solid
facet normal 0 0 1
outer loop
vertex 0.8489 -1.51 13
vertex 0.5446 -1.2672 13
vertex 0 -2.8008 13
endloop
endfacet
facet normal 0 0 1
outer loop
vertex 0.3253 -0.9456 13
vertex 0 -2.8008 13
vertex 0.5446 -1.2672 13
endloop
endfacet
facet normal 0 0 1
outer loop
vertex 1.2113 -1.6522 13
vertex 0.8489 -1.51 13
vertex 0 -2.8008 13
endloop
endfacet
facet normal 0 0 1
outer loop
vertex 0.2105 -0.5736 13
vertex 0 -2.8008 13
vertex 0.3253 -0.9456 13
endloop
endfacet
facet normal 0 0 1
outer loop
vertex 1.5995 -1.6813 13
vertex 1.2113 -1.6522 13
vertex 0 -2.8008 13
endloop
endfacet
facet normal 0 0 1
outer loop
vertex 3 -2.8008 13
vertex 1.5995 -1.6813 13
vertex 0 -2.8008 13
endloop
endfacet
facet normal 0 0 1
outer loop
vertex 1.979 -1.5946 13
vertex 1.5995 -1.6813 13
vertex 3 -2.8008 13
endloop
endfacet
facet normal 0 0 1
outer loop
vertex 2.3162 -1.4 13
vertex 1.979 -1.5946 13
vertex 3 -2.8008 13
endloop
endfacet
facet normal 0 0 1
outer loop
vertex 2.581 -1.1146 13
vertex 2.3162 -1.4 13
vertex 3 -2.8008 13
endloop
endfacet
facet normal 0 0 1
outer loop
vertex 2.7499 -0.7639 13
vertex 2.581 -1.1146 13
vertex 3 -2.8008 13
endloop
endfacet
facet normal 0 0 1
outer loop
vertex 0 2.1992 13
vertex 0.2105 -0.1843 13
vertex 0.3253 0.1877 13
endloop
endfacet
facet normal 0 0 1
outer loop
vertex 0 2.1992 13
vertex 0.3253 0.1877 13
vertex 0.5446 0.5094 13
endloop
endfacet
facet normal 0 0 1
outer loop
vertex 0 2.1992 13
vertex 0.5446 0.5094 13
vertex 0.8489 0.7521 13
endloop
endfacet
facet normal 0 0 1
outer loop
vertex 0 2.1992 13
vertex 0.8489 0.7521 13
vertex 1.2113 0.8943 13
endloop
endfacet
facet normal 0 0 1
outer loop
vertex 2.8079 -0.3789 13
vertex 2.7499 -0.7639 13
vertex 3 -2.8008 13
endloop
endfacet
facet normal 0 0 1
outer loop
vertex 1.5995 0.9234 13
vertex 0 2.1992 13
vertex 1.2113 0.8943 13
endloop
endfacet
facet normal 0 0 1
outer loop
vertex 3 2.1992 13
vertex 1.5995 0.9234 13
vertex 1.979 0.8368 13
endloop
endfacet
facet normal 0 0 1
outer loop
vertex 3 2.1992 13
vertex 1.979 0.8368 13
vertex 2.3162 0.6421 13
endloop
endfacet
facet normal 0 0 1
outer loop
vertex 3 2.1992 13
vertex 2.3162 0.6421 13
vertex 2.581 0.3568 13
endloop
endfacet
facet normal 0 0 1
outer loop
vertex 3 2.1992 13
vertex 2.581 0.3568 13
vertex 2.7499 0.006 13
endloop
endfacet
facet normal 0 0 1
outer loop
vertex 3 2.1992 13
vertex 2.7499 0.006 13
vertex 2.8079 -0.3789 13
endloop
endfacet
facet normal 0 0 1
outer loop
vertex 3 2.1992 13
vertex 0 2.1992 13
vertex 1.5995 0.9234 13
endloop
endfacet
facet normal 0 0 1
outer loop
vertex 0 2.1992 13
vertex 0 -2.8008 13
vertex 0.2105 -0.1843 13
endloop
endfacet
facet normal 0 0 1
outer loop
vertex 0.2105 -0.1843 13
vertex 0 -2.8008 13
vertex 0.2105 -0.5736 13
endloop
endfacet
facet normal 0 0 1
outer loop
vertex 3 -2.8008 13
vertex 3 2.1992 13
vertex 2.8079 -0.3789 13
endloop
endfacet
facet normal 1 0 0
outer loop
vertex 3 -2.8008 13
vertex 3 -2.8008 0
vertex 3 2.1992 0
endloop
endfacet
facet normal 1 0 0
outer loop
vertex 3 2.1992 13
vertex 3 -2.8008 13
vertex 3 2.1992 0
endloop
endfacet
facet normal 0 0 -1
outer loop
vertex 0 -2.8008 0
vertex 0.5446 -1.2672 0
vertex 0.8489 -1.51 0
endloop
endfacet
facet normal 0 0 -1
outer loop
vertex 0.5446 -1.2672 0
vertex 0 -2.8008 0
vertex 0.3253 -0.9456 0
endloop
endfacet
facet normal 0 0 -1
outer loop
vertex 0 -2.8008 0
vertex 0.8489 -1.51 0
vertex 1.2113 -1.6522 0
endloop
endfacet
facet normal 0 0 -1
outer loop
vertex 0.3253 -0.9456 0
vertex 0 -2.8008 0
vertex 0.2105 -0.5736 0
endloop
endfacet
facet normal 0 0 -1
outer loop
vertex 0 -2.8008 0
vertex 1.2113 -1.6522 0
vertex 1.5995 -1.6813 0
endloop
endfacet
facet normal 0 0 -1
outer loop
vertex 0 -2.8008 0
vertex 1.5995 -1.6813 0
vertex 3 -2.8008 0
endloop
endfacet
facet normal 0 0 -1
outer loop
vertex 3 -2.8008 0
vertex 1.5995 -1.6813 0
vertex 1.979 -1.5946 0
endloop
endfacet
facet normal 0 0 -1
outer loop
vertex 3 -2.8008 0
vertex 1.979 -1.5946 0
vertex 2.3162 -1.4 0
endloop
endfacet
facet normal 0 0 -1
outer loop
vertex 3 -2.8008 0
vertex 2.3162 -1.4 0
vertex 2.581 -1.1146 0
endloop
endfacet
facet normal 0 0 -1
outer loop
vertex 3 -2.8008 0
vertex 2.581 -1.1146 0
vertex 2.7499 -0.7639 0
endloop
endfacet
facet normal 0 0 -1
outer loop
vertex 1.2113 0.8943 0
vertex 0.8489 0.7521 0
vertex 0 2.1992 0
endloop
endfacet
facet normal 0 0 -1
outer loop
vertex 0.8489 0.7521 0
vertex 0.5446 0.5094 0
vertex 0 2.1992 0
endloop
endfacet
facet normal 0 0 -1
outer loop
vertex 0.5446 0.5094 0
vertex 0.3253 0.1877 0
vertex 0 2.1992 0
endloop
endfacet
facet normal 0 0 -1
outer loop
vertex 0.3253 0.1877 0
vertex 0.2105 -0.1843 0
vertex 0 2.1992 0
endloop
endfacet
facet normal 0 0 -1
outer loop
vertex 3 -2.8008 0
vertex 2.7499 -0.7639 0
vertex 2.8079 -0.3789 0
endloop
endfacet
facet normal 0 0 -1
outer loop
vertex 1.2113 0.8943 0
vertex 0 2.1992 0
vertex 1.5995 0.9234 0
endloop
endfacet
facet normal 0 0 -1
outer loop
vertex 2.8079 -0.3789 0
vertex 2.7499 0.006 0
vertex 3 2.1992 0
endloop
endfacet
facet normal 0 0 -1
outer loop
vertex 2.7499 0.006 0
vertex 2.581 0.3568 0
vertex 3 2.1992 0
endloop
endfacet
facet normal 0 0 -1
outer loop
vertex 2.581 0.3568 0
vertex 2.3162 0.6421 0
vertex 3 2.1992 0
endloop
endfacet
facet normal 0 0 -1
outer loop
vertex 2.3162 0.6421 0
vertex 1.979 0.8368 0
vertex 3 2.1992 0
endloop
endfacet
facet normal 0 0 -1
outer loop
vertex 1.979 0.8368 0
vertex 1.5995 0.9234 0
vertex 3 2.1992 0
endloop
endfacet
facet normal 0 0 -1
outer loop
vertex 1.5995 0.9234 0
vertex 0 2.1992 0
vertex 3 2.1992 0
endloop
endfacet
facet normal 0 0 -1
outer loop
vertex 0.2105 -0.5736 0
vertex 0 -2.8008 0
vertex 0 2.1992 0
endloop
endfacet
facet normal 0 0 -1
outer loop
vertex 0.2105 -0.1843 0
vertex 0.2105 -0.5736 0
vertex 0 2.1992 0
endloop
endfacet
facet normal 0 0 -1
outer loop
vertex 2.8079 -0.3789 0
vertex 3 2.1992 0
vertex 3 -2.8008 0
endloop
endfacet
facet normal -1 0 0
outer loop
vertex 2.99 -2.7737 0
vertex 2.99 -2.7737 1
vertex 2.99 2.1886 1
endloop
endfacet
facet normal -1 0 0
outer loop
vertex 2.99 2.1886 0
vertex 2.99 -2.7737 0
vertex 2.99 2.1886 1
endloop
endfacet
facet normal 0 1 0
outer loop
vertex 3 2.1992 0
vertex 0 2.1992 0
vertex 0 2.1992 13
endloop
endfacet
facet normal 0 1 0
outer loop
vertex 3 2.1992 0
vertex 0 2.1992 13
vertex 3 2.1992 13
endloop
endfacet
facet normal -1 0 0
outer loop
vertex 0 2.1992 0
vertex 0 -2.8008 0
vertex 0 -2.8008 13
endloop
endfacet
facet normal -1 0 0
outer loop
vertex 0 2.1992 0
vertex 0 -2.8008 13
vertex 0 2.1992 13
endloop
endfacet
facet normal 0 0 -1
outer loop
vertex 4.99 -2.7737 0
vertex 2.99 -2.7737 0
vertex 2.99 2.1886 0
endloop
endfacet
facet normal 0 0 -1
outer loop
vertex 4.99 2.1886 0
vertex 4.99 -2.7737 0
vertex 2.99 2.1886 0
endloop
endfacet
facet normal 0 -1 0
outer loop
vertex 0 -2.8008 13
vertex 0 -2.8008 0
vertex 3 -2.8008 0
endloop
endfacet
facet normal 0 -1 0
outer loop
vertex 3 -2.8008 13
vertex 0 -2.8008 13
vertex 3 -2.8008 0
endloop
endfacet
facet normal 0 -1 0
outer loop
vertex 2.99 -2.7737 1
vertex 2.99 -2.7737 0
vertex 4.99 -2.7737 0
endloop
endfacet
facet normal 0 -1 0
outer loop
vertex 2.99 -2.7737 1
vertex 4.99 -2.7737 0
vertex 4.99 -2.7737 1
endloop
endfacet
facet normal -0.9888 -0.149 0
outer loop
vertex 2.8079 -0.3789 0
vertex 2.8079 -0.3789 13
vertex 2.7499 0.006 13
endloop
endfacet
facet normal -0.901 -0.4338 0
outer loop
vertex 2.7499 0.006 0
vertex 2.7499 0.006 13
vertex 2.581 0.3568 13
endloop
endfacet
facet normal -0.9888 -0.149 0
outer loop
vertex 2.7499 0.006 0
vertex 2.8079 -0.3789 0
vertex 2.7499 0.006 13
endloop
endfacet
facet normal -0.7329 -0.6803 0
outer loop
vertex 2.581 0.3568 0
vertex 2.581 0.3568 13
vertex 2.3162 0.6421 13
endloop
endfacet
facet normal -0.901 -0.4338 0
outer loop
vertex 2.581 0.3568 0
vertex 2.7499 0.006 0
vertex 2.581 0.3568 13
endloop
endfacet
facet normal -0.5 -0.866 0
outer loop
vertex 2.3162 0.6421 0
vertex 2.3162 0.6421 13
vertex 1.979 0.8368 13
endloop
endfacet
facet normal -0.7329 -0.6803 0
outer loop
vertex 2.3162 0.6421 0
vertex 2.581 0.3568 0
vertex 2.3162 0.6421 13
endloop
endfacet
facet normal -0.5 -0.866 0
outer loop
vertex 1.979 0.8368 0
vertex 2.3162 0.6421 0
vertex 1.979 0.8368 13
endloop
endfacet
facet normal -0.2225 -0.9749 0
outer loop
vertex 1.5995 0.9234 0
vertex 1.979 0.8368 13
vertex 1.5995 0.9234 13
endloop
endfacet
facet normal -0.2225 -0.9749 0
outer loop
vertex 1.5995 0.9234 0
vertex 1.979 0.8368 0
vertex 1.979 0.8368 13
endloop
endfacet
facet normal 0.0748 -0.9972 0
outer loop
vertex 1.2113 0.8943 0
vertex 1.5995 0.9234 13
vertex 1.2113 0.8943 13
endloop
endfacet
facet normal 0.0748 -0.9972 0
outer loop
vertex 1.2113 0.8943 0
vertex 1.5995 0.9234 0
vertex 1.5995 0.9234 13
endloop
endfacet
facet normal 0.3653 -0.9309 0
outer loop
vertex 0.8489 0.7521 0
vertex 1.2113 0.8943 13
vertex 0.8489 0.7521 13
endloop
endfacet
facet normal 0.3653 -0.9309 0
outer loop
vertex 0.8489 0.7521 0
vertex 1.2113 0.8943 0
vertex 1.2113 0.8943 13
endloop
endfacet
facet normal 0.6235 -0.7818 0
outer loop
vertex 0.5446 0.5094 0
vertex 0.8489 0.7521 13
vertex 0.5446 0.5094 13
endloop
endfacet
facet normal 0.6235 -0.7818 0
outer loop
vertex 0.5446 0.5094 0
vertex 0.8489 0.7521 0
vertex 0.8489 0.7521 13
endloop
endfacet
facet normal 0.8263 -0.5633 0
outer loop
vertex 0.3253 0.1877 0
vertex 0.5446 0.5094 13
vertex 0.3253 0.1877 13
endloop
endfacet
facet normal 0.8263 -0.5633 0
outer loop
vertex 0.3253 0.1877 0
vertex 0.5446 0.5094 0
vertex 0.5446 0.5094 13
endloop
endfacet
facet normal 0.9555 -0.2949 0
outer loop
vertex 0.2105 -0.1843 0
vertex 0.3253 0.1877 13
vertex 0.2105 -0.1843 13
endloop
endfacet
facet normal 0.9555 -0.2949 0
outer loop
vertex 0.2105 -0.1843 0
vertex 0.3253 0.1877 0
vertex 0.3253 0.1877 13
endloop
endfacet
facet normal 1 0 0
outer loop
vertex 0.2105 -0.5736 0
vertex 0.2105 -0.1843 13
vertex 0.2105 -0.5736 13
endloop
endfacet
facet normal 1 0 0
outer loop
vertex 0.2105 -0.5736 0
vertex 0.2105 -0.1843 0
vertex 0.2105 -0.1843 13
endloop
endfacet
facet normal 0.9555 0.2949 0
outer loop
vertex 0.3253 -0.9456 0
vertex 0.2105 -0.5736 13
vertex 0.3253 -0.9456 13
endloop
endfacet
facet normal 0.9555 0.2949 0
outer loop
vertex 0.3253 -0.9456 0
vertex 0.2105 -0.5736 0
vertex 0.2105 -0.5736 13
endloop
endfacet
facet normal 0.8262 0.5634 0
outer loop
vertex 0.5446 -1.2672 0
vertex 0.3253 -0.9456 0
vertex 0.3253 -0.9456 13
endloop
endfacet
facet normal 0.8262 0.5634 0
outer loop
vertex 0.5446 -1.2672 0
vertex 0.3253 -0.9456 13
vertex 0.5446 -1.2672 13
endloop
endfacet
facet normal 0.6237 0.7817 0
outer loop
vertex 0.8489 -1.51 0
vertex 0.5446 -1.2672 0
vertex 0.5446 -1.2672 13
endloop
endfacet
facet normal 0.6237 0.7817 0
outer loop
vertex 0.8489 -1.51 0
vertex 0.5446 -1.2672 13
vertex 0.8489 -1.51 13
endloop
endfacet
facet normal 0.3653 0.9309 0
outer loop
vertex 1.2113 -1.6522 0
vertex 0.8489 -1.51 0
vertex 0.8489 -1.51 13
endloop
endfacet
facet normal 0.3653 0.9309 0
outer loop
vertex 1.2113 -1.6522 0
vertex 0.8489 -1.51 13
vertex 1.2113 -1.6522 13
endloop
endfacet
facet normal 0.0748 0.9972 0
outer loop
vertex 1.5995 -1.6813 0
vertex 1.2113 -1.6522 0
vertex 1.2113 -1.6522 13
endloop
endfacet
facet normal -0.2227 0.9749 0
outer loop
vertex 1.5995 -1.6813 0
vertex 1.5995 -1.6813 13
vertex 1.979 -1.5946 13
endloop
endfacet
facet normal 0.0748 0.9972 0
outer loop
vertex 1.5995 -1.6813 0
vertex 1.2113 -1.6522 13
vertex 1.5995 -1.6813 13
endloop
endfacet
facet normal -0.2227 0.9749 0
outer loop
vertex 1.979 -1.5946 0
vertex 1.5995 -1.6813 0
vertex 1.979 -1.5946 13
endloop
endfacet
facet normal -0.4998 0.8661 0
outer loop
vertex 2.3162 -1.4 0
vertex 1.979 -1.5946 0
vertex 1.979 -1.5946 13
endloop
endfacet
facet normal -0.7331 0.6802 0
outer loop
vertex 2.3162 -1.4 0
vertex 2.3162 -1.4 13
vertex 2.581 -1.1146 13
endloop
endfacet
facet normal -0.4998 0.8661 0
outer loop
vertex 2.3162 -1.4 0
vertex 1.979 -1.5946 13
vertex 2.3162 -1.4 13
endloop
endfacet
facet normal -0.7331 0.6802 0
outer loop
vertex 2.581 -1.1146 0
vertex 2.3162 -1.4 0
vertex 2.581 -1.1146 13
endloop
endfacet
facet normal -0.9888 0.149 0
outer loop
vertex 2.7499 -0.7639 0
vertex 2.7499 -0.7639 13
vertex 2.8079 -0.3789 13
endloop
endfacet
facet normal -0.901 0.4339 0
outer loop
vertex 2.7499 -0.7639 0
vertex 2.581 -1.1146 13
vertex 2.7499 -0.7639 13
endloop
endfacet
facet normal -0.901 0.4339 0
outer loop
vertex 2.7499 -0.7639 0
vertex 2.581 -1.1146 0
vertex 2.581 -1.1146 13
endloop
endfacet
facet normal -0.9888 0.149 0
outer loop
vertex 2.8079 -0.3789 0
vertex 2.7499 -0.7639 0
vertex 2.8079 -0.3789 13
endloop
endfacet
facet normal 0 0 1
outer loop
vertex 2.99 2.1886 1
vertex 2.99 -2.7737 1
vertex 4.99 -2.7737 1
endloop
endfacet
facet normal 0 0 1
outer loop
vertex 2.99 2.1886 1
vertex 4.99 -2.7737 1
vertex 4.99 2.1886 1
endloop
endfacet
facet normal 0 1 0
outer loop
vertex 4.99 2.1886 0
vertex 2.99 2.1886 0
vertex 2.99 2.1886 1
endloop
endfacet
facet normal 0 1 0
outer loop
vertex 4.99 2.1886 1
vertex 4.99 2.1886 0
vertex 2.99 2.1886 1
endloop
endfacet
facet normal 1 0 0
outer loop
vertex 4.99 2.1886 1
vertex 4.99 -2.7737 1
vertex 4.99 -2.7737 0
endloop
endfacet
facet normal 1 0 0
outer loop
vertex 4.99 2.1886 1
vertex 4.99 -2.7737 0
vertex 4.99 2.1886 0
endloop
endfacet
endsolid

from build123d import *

# Parameters (mm, degrees)
F0_W     = 3
F0_H     = 5
F1_DEPTH = 13
F3_W     = 4.9623721501
F3_H     = 1
F4_DEPTH = 2
F5_R     = 1.3059904098
F6_DEPTH = 43.8


with BuildPart() as f1:
    # F0 (on Top) → F1 (new body)
    with BuildSketch(Plane.XY):
        with Locations((1.5, -0.3008348739)):
            Rectangle(F0_W, F0_H)
    extrude(amount=F1_DEPTH)

    # F5 (on Top) → F6 (cut)
    with BuildSketch(Plane.XY):
        with Locations((1.5019174898, -0.378929486)):
            Circle(F5_R)
    extrude(amount=F6_DEPTH, mode=Mode.SUBTRACT)


with BuildPart() as f4:
    # F3 (on offset) → F4 (new body)
    with BuildSketch(Plane.YZ.offset(2.99)):
        with Locations((-0.2925620512, 0.5)):
            Rectangle(F3_W, F3_H)
    extrude(amount=F4_DEPTH)


solid = Compound([f1.part, f4.part])
